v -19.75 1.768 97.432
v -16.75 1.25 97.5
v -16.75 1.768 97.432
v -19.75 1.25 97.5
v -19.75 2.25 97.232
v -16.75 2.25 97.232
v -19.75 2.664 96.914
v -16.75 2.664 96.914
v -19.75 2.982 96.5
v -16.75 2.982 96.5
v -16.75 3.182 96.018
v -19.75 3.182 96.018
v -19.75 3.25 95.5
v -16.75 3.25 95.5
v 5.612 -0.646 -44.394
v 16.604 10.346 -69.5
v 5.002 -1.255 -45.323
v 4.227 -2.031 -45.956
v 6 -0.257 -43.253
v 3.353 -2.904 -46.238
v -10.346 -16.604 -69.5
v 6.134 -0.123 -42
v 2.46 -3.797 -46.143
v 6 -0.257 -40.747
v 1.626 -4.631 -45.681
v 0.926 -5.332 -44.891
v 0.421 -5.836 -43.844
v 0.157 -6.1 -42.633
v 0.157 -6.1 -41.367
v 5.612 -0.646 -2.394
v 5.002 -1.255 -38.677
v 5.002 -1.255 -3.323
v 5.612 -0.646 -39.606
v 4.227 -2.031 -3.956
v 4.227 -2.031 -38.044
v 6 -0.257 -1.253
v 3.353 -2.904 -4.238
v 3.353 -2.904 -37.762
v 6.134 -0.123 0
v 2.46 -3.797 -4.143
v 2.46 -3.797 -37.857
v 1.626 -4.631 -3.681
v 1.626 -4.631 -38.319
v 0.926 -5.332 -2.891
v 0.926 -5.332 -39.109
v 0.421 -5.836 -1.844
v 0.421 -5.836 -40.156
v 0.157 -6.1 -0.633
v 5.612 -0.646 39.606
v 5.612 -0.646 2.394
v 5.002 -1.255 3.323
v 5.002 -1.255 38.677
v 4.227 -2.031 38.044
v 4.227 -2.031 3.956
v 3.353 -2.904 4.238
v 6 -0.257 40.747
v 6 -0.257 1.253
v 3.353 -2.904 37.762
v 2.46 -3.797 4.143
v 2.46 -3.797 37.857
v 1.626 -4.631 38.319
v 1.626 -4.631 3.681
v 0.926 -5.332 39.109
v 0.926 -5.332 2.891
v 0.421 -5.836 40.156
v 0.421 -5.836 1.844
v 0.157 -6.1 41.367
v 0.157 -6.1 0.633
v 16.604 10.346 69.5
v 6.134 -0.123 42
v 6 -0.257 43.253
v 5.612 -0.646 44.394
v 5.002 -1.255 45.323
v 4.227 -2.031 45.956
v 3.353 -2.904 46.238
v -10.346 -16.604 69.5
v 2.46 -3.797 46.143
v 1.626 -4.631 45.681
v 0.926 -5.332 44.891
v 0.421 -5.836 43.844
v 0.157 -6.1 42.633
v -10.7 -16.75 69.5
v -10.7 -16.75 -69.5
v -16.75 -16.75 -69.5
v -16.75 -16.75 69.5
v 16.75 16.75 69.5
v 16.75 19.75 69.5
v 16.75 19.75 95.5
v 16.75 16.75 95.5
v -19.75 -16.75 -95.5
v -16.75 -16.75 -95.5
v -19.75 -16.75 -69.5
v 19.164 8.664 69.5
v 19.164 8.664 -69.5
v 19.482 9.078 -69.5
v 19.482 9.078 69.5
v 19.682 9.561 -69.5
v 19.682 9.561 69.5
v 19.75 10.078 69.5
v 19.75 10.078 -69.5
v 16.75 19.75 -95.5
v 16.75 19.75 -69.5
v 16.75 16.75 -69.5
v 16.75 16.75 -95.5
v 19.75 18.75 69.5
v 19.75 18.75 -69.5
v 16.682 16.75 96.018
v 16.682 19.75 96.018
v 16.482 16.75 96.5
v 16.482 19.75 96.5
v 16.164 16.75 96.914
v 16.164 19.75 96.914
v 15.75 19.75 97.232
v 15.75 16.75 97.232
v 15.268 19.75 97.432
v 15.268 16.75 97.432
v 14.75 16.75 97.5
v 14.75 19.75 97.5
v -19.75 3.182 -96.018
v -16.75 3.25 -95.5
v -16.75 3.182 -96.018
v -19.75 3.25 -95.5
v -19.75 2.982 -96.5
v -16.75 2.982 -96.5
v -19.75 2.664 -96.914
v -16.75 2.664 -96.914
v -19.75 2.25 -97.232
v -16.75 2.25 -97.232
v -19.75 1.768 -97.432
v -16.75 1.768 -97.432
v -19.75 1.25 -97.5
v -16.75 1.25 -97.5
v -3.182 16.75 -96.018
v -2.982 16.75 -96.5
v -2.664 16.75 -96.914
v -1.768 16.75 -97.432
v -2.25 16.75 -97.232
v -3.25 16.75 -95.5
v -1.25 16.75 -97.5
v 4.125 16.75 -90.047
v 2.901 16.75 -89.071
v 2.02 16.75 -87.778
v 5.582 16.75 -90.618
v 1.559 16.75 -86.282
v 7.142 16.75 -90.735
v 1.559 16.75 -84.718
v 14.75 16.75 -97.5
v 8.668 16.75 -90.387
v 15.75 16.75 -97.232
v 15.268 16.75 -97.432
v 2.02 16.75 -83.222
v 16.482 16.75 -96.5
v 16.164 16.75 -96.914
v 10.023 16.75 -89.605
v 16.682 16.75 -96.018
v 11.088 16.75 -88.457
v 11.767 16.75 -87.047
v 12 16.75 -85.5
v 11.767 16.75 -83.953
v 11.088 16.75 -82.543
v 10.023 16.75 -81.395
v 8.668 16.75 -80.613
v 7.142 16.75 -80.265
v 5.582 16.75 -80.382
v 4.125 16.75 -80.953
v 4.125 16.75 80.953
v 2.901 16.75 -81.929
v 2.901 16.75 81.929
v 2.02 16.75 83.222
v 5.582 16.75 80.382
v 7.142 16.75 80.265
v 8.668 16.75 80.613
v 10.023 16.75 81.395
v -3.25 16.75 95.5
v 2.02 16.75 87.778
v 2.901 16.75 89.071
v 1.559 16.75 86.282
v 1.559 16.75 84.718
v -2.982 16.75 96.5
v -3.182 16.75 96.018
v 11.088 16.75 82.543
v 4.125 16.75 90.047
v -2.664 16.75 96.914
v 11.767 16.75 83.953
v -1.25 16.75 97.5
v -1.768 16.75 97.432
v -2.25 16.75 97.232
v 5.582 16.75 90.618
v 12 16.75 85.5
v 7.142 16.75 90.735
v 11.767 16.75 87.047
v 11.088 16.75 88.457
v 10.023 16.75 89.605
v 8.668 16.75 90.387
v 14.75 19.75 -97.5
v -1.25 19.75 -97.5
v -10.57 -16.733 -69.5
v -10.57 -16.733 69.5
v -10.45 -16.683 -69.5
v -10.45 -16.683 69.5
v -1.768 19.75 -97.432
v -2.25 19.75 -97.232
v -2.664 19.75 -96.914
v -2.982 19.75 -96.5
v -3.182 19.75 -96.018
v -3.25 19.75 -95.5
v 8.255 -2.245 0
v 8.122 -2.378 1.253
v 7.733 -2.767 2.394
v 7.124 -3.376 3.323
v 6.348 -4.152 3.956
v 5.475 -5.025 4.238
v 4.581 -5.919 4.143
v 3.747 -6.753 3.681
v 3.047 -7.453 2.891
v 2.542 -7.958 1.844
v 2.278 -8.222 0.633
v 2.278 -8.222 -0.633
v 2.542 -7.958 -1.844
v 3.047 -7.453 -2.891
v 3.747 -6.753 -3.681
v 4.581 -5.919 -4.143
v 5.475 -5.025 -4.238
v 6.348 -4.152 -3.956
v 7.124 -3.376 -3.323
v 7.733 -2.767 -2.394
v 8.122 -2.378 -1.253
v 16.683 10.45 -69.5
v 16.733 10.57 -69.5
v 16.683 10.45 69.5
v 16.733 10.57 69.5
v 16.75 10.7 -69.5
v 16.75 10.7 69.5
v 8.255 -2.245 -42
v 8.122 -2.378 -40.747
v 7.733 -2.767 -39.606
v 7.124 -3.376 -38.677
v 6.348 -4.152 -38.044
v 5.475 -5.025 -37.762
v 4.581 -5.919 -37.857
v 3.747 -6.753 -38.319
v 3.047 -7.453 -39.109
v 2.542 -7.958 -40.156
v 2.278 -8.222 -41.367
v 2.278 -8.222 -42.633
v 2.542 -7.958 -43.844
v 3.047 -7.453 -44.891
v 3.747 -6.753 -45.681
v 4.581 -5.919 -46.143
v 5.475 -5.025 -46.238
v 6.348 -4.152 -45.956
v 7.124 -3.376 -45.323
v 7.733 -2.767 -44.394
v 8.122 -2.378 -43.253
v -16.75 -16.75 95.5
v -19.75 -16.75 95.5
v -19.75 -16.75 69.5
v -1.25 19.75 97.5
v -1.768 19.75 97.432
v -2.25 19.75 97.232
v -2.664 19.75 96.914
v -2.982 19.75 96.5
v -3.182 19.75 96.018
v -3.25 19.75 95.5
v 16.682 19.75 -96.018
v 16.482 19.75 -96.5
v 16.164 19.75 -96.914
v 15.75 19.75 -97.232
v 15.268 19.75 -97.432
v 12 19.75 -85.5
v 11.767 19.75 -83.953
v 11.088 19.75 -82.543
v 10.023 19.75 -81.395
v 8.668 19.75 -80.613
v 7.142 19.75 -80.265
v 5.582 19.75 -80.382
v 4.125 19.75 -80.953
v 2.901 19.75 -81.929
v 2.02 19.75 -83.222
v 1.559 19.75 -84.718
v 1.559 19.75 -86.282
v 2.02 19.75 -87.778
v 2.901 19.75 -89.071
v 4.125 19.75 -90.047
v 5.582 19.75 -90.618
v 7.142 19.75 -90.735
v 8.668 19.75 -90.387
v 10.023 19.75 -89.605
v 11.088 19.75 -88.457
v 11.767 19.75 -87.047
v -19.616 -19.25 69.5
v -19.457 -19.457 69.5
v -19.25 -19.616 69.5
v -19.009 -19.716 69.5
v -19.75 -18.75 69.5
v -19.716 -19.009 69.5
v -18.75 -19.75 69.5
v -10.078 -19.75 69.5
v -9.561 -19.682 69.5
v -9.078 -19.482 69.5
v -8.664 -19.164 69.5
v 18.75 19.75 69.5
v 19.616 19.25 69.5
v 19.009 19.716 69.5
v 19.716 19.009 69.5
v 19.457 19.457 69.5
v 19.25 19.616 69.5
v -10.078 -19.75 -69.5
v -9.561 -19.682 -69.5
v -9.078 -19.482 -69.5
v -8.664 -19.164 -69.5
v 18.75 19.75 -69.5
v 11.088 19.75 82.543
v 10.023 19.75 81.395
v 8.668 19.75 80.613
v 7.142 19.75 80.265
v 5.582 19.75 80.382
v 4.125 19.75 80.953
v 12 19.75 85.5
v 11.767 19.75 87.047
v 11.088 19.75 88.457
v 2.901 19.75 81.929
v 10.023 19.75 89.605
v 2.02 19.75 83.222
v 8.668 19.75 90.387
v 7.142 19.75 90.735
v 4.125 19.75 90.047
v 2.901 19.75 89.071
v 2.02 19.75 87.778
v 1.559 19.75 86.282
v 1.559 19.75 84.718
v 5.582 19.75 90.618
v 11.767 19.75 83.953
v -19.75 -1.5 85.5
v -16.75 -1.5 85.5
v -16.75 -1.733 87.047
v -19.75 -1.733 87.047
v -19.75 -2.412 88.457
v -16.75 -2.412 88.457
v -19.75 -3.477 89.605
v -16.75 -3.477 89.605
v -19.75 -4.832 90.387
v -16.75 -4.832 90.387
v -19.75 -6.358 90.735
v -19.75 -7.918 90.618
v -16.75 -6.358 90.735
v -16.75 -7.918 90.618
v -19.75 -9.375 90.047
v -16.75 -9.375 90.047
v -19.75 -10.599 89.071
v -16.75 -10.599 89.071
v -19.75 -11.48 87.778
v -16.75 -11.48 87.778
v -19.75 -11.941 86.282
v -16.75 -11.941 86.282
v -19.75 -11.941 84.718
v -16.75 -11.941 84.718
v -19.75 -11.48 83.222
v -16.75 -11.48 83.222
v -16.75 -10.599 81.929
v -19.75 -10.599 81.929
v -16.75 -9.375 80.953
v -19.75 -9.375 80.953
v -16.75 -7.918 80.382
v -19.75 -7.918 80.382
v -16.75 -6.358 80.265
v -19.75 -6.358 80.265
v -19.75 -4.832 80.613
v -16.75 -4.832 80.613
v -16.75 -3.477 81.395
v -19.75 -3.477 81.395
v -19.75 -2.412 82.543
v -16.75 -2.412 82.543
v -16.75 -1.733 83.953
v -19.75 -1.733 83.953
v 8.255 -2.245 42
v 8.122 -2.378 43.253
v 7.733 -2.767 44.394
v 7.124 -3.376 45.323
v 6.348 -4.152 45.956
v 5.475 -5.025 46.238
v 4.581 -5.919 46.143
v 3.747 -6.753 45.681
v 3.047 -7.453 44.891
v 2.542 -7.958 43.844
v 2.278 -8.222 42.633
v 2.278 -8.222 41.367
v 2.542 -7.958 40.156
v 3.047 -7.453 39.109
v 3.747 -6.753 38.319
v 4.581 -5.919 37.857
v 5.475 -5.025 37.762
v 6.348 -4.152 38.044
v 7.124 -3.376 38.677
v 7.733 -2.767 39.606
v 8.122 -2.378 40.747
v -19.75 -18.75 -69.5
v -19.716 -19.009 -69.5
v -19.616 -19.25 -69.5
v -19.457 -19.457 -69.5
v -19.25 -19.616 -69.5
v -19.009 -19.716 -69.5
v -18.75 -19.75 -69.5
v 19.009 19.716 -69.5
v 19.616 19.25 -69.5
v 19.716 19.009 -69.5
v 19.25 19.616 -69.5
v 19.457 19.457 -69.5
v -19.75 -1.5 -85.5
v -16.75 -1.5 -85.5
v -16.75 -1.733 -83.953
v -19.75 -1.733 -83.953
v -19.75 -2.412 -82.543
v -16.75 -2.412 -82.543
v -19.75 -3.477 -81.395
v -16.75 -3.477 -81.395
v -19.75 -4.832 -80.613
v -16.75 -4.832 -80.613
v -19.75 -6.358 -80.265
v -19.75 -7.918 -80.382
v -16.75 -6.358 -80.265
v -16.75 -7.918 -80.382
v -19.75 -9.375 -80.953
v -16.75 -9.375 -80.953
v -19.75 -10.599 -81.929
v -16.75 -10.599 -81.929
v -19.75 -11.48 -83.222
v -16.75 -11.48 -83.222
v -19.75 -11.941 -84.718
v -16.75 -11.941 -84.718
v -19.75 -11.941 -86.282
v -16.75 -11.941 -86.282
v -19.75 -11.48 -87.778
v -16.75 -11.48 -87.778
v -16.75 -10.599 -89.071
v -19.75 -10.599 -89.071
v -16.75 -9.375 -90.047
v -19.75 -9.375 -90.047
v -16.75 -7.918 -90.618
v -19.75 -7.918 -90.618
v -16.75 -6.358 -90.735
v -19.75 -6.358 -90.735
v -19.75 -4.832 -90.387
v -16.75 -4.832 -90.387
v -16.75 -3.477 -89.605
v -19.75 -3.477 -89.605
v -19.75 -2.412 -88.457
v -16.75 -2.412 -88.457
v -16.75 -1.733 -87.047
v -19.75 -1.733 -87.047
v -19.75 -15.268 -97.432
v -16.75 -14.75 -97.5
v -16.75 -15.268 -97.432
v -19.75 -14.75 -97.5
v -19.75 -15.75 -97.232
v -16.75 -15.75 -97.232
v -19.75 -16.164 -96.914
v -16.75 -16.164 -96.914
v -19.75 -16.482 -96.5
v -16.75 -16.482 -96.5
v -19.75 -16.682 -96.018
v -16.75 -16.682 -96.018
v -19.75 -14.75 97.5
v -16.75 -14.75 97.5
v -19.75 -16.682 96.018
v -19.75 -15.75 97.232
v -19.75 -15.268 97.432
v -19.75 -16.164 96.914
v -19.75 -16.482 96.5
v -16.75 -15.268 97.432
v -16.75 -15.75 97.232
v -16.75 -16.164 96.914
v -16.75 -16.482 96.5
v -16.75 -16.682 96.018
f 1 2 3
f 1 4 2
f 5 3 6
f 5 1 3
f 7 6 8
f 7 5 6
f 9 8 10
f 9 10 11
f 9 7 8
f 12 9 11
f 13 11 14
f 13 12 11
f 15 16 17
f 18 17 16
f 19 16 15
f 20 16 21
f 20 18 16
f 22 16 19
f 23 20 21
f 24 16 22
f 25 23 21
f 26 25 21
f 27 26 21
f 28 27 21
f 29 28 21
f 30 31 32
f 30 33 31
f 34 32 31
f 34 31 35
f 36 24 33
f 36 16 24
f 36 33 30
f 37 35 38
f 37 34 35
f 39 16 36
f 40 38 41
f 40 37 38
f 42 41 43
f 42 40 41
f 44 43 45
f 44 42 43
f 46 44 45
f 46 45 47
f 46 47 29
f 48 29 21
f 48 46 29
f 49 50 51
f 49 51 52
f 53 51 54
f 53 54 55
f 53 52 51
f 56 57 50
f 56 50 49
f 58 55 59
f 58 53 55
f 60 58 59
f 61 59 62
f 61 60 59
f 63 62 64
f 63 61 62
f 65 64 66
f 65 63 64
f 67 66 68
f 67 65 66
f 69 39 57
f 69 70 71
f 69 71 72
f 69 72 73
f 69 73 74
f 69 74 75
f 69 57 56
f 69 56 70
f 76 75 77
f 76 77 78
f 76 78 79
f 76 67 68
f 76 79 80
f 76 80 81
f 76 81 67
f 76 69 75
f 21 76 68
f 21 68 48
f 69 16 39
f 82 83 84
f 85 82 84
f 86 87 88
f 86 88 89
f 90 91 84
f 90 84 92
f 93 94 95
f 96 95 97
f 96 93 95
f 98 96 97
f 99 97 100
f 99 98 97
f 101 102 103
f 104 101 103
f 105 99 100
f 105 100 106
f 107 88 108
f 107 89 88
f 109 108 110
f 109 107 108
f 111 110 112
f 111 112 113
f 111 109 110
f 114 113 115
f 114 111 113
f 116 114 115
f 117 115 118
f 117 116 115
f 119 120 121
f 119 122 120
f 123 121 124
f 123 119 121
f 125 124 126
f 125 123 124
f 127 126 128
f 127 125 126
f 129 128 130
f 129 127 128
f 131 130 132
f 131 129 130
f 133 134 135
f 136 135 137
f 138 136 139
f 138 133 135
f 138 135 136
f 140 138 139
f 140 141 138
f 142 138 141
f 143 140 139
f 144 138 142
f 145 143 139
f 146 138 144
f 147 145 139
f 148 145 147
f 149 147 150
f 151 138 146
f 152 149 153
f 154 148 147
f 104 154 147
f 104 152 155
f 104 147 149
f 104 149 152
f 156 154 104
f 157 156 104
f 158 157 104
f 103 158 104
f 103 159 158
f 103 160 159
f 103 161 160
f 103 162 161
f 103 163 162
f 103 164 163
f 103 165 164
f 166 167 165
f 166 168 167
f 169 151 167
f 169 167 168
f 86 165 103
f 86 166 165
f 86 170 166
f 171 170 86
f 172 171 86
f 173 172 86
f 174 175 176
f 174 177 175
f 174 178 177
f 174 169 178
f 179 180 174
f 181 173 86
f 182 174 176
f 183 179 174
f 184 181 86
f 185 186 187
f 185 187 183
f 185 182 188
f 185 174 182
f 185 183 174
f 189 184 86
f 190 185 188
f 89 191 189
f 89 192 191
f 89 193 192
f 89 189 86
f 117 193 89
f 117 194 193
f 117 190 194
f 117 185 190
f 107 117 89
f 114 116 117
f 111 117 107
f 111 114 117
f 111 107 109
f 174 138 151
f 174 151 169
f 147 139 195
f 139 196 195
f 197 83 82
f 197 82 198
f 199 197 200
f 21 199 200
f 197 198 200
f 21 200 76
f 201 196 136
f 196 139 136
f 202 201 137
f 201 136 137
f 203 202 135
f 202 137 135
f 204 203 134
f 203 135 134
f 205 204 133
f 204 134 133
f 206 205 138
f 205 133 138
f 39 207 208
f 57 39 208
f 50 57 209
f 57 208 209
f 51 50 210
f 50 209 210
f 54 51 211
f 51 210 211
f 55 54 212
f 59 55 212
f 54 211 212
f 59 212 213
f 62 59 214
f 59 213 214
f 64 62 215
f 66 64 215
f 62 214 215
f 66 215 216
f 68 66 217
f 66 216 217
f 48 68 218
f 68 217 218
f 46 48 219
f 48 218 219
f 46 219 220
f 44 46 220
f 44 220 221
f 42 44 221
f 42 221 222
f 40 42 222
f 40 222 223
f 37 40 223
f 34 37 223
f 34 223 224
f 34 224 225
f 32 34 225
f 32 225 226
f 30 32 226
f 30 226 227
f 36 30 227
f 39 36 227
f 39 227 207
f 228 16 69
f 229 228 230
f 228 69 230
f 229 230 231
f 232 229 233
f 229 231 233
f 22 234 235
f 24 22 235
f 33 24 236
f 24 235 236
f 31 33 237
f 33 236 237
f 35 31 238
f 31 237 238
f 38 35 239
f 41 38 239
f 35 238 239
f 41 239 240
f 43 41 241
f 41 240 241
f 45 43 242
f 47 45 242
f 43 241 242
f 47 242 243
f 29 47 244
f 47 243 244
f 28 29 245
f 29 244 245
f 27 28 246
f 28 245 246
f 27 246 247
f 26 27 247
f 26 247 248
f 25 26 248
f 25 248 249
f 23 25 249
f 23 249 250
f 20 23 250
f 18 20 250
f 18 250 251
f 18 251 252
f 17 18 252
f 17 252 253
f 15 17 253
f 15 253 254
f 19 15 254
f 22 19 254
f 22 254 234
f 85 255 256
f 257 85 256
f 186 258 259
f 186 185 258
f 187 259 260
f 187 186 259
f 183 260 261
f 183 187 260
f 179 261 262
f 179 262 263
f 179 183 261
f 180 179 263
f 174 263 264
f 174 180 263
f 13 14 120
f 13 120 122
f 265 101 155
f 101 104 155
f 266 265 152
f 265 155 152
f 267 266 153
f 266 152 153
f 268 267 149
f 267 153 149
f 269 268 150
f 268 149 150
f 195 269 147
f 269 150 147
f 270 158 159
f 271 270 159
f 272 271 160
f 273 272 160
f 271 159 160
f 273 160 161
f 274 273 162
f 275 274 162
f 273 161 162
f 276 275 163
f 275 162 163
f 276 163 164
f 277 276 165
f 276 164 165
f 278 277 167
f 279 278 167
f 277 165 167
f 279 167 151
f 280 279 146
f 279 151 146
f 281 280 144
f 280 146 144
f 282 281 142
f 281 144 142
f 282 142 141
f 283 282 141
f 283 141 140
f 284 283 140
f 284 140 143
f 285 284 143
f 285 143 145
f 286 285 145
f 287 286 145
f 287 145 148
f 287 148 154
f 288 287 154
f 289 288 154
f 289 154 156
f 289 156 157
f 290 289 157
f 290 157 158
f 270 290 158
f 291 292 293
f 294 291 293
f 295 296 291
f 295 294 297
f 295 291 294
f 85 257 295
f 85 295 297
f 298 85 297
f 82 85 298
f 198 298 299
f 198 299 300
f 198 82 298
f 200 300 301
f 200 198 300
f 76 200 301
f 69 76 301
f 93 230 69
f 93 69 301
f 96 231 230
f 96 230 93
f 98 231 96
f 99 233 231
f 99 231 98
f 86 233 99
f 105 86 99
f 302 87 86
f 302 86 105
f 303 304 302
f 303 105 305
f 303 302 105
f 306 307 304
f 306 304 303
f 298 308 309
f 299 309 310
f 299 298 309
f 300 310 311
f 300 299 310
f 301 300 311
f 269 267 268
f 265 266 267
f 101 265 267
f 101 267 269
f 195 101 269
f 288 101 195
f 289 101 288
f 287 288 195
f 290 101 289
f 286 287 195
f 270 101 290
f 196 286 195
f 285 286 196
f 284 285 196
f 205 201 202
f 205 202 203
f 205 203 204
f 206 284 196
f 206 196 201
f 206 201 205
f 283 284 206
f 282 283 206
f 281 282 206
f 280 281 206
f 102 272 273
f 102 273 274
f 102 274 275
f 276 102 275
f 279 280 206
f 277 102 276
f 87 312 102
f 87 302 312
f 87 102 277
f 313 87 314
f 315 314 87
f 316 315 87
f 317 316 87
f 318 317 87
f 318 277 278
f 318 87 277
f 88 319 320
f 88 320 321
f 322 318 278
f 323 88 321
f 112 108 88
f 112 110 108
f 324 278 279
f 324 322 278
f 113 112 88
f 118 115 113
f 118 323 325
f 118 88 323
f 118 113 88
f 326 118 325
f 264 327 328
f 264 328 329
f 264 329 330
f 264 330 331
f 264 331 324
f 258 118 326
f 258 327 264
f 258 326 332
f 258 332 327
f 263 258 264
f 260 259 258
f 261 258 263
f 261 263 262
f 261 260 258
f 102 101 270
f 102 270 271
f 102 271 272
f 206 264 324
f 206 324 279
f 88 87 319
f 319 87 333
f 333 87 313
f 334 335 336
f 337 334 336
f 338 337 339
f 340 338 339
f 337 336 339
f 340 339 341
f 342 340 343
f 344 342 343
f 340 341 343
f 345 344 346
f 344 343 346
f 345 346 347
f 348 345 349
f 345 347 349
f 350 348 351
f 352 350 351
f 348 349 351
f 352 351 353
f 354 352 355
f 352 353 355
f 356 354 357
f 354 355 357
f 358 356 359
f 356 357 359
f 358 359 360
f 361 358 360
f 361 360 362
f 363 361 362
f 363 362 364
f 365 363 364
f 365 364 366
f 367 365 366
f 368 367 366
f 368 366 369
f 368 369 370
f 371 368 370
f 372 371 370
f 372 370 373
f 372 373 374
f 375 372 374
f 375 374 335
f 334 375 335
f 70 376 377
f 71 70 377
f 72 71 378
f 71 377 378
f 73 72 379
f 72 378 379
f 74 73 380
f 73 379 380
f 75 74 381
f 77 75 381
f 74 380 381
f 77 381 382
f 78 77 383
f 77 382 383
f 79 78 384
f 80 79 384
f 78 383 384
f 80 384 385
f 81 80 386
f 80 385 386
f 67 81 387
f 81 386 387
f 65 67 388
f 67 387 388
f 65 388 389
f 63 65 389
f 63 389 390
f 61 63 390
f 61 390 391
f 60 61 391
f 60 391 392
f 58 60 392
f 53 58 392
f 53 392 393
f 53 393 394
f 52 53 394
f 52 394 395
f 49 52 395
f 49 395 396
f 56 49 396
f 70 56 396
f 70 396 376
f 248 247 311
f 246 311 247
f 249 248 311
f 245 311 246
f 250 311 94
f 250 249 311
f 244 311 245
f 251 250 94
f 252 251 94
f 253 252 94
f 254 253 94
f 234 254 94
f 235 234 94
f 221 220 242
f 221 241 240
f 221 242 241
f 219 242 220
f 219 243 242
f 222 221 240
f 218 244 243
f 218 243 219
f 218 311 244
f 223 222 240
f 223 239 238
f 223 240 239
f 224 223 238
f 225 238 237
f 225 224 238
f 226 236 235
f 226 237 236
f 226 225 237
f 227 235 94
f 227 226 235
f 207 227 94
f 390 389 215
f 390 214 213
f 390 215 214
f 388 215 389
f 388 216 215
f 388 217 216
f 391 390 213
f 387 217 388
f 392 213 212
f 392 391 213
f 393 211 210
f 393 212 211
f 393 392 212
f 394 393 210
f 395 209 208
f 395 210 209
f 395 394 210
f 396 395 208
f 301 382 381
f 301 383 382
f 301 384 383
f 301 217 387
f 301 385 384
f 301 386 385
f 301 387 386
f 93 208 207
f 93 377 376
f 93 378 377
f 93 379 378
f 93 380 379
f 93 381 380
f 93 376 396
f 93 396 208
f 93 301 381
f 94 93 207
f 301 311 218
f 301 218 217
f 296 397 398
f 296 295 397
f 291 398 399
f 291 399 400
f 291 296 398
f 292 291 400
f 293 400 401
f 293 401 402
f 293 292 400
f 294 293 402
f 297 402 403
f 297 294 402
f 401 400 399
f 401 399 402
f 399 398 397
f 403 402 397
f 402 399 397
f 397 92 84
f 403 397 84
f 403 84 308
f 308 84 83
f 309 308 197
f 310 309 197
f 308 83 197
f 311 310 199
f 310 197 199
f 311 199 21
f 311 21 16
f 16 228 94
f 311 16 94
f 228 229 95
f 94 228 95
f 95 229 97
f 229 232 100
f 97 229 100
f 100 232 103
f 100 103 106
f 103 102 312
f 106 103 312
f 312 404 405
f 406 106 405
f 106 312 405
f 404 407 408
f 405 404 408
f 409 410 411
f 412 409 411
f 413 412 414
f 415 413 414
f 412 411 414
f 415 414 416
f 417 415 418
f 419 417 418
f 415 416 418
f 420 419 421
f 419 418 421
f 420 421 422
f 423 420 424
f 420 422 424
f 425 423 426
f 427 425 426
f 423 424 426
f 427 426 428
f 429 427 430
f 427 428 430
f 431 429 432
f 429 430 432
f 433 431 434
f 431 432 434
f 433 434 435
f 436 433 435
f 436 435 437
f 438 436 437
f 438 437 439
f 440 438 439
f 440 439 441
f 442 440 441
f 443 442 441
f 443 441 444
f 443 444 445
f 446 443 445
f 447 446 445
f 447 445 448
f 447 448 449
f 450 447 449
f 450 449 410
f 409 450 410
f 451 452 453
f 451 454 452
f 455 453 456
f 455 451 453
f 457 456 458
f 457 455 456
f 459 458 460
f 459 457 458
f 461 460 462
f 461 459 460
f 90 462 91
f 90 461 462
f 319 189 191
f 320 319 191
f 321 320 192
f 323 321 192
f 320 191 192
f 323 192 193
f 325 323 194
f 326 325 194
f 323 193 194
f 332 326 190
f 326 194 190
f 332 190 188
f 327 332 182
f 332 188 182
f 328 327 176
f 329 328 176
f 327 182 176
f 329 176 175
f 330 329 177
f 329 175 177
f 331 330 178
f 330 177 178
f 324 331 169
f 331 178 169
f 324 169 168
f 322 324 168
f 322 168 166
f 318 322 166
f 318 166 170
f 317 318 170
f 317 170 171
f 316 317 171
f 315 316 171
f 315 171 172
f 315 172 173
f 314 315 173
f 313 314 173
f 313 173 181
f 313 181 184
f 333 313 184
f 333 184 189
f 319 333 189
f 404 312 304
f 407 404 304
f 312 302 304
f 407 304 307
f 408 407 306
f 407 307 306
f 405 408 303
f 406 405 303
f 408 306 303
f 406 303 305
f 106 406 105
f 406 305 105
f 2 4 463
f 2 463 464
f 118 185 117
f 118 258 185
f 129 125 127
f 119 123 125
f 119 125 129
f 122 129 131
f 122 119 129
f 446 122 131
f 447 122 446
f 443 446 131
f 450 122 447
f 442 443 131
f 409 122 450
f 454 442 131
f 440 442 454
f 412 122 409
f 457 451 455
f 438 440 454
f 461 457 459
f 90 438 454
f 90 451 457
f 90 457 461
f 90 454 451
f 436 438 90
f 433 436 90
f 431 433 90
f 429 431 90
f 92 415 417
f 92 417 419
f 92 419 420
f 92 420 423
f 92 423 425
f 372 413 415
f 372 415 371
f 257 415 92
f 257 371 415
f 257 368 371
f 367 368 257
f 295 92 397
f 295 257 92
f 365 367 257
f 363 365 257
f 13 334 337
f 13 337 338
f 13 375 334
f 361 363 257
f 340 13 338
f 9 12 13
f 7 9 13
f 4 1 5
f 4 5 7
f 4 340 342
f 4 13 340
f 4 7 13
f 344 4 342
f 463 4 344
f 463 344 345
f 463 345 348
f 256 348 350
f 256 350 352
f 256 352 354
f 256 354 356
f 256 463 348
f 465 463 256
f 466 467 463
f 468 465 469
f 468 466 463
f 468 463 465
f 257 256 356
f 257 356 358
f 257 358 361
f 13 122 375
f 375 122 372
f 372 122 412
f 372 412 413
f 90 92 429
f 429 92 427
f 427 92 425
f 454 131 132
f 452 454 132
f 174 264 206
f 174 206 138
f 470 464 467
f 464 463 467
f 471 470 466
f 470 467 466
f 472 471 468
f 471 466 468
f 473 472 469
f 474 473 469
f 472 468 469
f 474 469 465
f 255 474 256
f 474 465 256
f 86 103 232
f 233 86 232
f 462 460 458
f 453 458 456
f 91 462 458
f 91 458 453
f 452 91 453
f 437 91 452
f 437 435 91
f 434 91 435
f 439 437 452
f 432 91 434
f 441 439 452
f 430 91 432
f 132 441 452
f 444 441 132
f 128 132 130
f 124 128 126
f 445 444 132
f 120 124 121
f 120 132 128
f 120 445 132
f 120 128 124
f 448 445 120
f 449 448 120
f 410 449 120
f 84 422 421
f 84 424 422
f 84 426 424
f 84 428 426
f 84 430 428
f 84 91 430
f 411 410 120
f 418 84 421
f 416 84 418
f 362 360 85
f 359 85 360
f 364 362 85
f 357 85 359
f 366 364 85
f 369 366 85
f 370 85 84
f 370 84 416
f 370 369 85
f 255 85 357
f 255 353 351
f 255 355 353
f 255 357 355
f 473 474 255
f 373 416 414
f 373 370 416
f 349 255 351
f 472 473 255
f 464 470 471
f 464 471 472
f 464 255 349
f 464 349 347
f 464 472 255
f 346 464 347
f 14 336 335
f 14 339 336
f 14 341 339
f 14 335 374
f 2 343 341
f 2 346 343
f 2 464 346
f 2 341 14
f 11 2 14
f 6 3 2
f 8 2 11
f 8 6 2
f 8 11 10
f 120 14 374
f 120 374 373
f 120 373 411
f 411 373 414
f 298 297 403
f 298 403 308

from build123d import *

# Parameters (mm, degrees)
F1_DEPTH = 97.5
F3_DEPTH = 28
F4_R     = 4.25
F5_DEPTH = 25
F6_R     = 5.25
F7_DEPTH = 25
F8_R     = 5.25
F9_DEPTH = 25
F10_R    = 2
F11_R    = 0.5
F12_R    = 1


# Not quite as in the source:
# - a pattern or mirror of a feature is missing from the dataset's text; its kind, count and spacing are read off the source's solid


with BuildPart() as f1:
    # F0 (on Top) → F1 (new body, symmetric)
    with BuildSketch(Plane.XY):
        Polygon((-19.75, 3.25), (-19.75, -19.75), (-9.25, -19.75), (19.75, 9.25), (19.75, 19.75), (-3.25, 19.75), (-3.25, 16.75), (16.75, 16.75), (16.75, 10.4926406871), (-10.4926406871, -16.75), (-16.75, -16.75), (-16.75, 3.25), align=None)
    extrude(amount=F1_DEPTH, both=True)

    # F2 (on face) → F3 (cut)
    with BuildSketch(Plane.XY.offset(97.5)):
        Polygon((-10.4926406871, -16.75), (-16.75, -16.75), (-19.75, -16.75), (-19.75, -19.75), (-9.25, -19.75), (19.75, 9.25), (19.75, 19.75), (16.75, 19.75), (16.75, 16.75), (16.75, 10.4926406871), align=None)
    f3 = extrude(amount=-F3_DEPTH, mode=Mode.SUBTRACT)

    # F3_copies: F3 across plane
    add(f3.mirror(Plane(origin=(0, 0, 0), x_dir=(-1, 0, 0), z_dir=(0, 0, -1))), mode=Mode.SUBTRACT)

    # F4 (on face) → F5 (cut)
    with BuildSketch(Plane(origin=(5.25, -5.25, 0), x_dir=(0.7071067812, 0.7071067812, 0), z_dir=(0.7071067812, -0.7071067812, 0))):
        with Locations((0, 42)):
            Circle(F4_R)
        with Locations((0, -42)):
            Circle(F4_R)
        Circle(F4_R)
    extrude(amount=-F5_DEPTH, mode=Mode.SUBTRACT)

    # F6 (on face) → F7 (cut)
    with BuildSketch(Plane.YZ.offset(-16.75)):
        with Locations((-6.75, 85.5)):
            Circle(F6_R)
        with Locations((-6.75, -85.5)):
            Circle(F6_R)
    extrude(amount=-F7_DEPTH, mode=Mode.SUBTRACT)

    # F8 (on face) → F9 (cut)
    with BuildSketch(Plane.XZ.offset(-16.75)):
        with Locations((6.75, 85.5)):
            Circle(F8_R)
        with Locations((6.75, -85.5)):
            Circle(F8_R)
    extrude(amount=-F9_DEPTH, mode=Mode.SUBTRACT)

    # F10
    f10_edges = [f1.edges().sort_by_distance(p)[0] for p in [
        (-9.25, -19.75, 0),
        (19.75, 9.25, 0),
        (-18.25, -16.75, 97.5),
        (-18.25, 3.25, 97.5),
        (-3.25, 18.25, 97.5),
        (16.75, 18.25, 97.5),
        (-18.25, 3.25, -97.5),
        (-3.25, 18.25, -97.5),
        (-18.25, -16.75, -97.5),
        (16.75, 18.25, -97.5),
    ]]
    fillet(f10_edges, radius=F10_R)

    # F11
    f11_edges = [f1.edges().sort_by_distance(p)[0] for p in [
        (16.75, 10.492641, 0),
        (-10.492641, -16.75, 0),
    ]]
    fillet(f11_edges, radius=F11_R)

    # F12
    f12_edges = [f1.edges().sort_by_distance(p)[0] for p in [
        (-19.75, -19.75, 0),
        (19.75, 19.75, 0),
    ]]
    fillet(f12_edges, radius=F12_R)


solid = f1.part
